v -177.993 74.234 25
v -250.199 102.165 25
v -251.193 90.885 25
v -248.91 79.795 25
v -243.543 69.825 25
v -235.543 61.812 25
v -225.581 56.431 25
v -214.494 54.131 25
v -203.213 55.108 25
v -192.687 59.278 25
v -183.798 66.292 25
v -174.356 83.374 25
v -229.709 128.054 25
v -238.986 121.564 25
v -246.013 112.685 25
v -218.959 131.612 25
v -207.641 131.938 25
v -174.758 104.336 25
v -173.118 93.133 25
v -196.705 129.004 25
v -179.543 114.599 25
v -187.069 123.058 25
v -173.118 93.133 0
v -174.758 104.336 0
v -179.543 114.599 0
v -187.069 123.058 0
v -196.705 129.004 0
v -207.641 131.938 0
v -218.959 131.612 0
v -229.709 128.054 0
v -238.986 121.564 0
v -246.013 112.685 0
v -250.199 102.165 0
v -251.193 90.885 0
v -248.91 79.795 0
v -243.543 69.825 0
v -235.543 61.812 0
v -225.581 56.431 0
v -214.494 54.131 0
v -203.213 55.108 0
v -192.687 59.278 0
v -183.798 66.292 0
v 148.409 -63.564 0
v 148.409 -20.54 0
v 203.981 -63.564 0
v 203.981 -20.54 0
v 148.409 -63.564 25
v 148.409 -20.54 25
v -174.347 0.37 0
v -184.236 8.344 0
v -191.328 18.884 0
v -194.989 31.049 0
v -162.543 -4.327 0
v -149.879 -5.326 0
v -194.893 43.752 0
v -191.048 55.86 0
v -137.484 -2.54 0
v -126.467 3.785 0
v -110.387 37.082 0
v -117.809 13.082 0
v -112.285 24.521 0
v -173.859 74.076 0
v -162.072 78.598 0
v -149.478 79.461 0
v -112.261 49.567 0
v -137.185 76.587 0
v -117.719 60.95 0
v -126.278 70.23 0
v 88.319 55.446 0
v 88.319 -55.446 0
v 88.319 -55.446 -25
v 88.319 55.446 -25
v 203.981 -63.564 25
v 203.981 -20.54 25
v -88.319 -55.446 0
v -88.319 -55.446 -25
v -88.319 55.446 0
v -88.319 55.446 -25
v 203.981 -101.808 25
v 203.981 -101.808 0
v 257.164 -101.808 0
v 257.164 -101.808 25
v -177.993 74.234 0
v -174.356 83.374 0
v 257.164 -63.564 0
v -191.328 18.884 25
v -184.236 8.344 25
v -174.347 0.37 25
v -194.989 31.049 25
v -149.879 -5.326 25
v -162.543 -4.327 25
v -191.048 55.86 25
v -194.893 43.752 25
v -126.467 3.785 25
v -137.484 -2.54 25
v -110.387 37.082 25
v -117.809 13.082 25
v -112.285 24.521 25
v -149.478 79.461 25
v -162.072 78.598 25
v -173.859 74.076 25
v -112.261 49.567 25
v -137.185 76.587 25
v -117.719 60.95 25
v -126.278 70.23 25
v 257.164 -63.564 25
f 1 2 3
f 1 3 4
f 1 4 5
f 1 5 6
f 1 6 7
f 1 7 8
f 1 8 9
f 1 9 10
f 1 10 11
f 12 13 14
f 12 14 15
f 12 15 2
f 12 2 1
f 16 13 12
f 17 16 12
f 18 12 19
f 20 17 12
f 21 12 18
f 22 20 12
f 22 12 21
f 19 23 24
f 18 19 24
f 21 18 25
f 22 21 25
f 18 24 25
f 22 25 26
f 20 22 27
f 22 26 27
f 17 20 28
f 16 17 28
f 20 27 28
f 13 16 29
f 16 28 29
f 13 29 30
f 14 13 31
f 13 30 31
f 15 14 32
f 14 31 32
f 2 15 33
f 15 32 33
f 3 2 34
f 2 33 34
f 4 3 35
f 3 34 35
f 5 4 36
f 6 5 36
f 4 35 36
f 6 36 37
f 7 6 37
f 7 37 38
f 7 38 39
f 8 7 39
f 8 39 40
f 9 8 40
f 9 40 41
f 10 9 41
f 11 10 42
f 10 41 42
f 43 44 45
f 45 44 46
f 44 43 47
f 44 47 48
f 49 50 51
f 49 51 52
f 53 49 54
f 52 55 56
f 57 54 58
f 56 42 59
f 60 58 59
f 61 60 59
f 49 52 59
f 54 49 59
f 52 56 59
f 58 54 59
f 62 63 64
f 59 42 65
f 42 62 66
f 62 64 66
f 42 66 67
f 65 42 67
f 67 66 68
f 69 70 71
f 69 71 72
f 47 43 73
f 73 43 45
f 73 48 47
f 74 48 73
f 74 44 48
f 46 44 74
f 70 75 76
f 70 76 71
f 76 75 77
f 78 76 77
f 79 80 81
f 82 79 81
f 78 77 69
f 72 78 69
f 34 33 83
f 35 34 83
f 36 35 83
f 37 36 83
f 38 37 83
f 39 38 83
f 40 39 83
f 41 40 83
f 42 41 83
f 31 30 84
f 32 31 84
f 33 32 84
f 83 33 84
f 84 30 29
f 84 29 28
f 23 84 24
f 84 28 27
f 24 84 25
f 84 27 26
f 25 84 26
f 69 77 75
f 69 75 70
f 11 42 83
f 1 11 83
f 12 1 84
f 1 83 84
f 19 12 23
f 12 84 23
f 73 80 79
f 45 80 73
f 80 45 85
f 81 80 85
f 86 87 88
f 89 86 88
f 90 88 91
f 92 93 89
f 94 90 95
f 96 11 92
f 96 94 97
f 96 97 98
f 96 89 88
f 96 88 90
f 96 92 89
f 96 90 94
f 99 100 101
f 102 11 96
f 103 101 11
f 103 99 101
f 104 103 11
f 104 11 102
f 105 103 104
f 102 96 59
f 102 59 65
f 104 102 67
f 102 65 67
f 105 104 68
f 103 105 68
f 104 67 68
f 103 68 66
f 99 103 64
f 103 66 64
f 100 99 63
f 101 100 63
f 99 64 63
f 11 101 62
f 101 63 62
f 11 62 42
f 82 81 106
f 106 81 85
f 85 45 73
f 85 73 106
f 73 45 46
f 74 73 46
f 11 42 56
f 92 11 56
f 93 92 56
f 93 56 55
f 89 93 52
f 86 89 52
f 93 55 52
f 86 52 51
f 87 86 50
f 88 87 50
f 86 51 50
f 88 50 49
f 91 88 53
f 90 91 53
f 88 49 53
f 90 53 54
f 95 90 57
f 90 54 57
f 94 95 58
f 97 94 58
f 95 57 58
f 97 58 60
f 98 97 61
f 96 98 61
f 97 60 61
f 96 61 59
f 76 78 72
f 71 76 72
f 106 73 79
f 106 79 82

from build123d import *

# Parameters (mm, degrees)
F0_W     = 176.637814
F0_H     = 110.891848
F1_DEPTH = 25
F2_W     = 53.182662
F2_H     = 38.243696
F2_W_2   = 55.572867
F2_H_2   = 43.024168
F3_DEPTH = 25
F5_DEPTH = 25


with BuildPart() as f1:
    # F0 (on Top) → F1 (new body)
    with BuildSketch(Plane.XY):
        Rectangle(F0_W, F0_H)
    extrude(amount=-F1_DEPTH)


with BuildPart() as f3:
    # F2 (on Top) → F3 (new body)
    with BuildSketch(Plane.XY):
        with Locations((230.57279, -82.685821)):
            Rectangle(F2_W, F2_H)
        with Locations((176.195025, -42.051889)):
            Rectangle(F2_W_2, F2_H_2)
    extrude(amount=F3_DEPTH)


with BuildPart() as f5:
    # F4 (on Top) → F5 (new body)
    with BuildSketch(Plane.XY):
        with BuildLine():
            ThreePointArc((-183.797501, 66.291624), (-175.885617, 78.689059), (-173.117582, 93.133169))
            ThreePointArc((-173.117582, 93.133169), (-248.489575, 107.577279), (-183.797501, 66.291624))
        make_face()
        with BuildLine():
            ThreePointArc((-110.386824, 37.082419), (-137.184947, 76.586549), (-183.797501, 66.291624))
            ThreePointArc((-183.797501, 66.291624), (-168.621362, -2.421711), (-110.386824, 37.082419))
        make_face()
    extrude(amount=F5_DEPTH)


solid = Compound([f1.part, f3.part, f5.part])
